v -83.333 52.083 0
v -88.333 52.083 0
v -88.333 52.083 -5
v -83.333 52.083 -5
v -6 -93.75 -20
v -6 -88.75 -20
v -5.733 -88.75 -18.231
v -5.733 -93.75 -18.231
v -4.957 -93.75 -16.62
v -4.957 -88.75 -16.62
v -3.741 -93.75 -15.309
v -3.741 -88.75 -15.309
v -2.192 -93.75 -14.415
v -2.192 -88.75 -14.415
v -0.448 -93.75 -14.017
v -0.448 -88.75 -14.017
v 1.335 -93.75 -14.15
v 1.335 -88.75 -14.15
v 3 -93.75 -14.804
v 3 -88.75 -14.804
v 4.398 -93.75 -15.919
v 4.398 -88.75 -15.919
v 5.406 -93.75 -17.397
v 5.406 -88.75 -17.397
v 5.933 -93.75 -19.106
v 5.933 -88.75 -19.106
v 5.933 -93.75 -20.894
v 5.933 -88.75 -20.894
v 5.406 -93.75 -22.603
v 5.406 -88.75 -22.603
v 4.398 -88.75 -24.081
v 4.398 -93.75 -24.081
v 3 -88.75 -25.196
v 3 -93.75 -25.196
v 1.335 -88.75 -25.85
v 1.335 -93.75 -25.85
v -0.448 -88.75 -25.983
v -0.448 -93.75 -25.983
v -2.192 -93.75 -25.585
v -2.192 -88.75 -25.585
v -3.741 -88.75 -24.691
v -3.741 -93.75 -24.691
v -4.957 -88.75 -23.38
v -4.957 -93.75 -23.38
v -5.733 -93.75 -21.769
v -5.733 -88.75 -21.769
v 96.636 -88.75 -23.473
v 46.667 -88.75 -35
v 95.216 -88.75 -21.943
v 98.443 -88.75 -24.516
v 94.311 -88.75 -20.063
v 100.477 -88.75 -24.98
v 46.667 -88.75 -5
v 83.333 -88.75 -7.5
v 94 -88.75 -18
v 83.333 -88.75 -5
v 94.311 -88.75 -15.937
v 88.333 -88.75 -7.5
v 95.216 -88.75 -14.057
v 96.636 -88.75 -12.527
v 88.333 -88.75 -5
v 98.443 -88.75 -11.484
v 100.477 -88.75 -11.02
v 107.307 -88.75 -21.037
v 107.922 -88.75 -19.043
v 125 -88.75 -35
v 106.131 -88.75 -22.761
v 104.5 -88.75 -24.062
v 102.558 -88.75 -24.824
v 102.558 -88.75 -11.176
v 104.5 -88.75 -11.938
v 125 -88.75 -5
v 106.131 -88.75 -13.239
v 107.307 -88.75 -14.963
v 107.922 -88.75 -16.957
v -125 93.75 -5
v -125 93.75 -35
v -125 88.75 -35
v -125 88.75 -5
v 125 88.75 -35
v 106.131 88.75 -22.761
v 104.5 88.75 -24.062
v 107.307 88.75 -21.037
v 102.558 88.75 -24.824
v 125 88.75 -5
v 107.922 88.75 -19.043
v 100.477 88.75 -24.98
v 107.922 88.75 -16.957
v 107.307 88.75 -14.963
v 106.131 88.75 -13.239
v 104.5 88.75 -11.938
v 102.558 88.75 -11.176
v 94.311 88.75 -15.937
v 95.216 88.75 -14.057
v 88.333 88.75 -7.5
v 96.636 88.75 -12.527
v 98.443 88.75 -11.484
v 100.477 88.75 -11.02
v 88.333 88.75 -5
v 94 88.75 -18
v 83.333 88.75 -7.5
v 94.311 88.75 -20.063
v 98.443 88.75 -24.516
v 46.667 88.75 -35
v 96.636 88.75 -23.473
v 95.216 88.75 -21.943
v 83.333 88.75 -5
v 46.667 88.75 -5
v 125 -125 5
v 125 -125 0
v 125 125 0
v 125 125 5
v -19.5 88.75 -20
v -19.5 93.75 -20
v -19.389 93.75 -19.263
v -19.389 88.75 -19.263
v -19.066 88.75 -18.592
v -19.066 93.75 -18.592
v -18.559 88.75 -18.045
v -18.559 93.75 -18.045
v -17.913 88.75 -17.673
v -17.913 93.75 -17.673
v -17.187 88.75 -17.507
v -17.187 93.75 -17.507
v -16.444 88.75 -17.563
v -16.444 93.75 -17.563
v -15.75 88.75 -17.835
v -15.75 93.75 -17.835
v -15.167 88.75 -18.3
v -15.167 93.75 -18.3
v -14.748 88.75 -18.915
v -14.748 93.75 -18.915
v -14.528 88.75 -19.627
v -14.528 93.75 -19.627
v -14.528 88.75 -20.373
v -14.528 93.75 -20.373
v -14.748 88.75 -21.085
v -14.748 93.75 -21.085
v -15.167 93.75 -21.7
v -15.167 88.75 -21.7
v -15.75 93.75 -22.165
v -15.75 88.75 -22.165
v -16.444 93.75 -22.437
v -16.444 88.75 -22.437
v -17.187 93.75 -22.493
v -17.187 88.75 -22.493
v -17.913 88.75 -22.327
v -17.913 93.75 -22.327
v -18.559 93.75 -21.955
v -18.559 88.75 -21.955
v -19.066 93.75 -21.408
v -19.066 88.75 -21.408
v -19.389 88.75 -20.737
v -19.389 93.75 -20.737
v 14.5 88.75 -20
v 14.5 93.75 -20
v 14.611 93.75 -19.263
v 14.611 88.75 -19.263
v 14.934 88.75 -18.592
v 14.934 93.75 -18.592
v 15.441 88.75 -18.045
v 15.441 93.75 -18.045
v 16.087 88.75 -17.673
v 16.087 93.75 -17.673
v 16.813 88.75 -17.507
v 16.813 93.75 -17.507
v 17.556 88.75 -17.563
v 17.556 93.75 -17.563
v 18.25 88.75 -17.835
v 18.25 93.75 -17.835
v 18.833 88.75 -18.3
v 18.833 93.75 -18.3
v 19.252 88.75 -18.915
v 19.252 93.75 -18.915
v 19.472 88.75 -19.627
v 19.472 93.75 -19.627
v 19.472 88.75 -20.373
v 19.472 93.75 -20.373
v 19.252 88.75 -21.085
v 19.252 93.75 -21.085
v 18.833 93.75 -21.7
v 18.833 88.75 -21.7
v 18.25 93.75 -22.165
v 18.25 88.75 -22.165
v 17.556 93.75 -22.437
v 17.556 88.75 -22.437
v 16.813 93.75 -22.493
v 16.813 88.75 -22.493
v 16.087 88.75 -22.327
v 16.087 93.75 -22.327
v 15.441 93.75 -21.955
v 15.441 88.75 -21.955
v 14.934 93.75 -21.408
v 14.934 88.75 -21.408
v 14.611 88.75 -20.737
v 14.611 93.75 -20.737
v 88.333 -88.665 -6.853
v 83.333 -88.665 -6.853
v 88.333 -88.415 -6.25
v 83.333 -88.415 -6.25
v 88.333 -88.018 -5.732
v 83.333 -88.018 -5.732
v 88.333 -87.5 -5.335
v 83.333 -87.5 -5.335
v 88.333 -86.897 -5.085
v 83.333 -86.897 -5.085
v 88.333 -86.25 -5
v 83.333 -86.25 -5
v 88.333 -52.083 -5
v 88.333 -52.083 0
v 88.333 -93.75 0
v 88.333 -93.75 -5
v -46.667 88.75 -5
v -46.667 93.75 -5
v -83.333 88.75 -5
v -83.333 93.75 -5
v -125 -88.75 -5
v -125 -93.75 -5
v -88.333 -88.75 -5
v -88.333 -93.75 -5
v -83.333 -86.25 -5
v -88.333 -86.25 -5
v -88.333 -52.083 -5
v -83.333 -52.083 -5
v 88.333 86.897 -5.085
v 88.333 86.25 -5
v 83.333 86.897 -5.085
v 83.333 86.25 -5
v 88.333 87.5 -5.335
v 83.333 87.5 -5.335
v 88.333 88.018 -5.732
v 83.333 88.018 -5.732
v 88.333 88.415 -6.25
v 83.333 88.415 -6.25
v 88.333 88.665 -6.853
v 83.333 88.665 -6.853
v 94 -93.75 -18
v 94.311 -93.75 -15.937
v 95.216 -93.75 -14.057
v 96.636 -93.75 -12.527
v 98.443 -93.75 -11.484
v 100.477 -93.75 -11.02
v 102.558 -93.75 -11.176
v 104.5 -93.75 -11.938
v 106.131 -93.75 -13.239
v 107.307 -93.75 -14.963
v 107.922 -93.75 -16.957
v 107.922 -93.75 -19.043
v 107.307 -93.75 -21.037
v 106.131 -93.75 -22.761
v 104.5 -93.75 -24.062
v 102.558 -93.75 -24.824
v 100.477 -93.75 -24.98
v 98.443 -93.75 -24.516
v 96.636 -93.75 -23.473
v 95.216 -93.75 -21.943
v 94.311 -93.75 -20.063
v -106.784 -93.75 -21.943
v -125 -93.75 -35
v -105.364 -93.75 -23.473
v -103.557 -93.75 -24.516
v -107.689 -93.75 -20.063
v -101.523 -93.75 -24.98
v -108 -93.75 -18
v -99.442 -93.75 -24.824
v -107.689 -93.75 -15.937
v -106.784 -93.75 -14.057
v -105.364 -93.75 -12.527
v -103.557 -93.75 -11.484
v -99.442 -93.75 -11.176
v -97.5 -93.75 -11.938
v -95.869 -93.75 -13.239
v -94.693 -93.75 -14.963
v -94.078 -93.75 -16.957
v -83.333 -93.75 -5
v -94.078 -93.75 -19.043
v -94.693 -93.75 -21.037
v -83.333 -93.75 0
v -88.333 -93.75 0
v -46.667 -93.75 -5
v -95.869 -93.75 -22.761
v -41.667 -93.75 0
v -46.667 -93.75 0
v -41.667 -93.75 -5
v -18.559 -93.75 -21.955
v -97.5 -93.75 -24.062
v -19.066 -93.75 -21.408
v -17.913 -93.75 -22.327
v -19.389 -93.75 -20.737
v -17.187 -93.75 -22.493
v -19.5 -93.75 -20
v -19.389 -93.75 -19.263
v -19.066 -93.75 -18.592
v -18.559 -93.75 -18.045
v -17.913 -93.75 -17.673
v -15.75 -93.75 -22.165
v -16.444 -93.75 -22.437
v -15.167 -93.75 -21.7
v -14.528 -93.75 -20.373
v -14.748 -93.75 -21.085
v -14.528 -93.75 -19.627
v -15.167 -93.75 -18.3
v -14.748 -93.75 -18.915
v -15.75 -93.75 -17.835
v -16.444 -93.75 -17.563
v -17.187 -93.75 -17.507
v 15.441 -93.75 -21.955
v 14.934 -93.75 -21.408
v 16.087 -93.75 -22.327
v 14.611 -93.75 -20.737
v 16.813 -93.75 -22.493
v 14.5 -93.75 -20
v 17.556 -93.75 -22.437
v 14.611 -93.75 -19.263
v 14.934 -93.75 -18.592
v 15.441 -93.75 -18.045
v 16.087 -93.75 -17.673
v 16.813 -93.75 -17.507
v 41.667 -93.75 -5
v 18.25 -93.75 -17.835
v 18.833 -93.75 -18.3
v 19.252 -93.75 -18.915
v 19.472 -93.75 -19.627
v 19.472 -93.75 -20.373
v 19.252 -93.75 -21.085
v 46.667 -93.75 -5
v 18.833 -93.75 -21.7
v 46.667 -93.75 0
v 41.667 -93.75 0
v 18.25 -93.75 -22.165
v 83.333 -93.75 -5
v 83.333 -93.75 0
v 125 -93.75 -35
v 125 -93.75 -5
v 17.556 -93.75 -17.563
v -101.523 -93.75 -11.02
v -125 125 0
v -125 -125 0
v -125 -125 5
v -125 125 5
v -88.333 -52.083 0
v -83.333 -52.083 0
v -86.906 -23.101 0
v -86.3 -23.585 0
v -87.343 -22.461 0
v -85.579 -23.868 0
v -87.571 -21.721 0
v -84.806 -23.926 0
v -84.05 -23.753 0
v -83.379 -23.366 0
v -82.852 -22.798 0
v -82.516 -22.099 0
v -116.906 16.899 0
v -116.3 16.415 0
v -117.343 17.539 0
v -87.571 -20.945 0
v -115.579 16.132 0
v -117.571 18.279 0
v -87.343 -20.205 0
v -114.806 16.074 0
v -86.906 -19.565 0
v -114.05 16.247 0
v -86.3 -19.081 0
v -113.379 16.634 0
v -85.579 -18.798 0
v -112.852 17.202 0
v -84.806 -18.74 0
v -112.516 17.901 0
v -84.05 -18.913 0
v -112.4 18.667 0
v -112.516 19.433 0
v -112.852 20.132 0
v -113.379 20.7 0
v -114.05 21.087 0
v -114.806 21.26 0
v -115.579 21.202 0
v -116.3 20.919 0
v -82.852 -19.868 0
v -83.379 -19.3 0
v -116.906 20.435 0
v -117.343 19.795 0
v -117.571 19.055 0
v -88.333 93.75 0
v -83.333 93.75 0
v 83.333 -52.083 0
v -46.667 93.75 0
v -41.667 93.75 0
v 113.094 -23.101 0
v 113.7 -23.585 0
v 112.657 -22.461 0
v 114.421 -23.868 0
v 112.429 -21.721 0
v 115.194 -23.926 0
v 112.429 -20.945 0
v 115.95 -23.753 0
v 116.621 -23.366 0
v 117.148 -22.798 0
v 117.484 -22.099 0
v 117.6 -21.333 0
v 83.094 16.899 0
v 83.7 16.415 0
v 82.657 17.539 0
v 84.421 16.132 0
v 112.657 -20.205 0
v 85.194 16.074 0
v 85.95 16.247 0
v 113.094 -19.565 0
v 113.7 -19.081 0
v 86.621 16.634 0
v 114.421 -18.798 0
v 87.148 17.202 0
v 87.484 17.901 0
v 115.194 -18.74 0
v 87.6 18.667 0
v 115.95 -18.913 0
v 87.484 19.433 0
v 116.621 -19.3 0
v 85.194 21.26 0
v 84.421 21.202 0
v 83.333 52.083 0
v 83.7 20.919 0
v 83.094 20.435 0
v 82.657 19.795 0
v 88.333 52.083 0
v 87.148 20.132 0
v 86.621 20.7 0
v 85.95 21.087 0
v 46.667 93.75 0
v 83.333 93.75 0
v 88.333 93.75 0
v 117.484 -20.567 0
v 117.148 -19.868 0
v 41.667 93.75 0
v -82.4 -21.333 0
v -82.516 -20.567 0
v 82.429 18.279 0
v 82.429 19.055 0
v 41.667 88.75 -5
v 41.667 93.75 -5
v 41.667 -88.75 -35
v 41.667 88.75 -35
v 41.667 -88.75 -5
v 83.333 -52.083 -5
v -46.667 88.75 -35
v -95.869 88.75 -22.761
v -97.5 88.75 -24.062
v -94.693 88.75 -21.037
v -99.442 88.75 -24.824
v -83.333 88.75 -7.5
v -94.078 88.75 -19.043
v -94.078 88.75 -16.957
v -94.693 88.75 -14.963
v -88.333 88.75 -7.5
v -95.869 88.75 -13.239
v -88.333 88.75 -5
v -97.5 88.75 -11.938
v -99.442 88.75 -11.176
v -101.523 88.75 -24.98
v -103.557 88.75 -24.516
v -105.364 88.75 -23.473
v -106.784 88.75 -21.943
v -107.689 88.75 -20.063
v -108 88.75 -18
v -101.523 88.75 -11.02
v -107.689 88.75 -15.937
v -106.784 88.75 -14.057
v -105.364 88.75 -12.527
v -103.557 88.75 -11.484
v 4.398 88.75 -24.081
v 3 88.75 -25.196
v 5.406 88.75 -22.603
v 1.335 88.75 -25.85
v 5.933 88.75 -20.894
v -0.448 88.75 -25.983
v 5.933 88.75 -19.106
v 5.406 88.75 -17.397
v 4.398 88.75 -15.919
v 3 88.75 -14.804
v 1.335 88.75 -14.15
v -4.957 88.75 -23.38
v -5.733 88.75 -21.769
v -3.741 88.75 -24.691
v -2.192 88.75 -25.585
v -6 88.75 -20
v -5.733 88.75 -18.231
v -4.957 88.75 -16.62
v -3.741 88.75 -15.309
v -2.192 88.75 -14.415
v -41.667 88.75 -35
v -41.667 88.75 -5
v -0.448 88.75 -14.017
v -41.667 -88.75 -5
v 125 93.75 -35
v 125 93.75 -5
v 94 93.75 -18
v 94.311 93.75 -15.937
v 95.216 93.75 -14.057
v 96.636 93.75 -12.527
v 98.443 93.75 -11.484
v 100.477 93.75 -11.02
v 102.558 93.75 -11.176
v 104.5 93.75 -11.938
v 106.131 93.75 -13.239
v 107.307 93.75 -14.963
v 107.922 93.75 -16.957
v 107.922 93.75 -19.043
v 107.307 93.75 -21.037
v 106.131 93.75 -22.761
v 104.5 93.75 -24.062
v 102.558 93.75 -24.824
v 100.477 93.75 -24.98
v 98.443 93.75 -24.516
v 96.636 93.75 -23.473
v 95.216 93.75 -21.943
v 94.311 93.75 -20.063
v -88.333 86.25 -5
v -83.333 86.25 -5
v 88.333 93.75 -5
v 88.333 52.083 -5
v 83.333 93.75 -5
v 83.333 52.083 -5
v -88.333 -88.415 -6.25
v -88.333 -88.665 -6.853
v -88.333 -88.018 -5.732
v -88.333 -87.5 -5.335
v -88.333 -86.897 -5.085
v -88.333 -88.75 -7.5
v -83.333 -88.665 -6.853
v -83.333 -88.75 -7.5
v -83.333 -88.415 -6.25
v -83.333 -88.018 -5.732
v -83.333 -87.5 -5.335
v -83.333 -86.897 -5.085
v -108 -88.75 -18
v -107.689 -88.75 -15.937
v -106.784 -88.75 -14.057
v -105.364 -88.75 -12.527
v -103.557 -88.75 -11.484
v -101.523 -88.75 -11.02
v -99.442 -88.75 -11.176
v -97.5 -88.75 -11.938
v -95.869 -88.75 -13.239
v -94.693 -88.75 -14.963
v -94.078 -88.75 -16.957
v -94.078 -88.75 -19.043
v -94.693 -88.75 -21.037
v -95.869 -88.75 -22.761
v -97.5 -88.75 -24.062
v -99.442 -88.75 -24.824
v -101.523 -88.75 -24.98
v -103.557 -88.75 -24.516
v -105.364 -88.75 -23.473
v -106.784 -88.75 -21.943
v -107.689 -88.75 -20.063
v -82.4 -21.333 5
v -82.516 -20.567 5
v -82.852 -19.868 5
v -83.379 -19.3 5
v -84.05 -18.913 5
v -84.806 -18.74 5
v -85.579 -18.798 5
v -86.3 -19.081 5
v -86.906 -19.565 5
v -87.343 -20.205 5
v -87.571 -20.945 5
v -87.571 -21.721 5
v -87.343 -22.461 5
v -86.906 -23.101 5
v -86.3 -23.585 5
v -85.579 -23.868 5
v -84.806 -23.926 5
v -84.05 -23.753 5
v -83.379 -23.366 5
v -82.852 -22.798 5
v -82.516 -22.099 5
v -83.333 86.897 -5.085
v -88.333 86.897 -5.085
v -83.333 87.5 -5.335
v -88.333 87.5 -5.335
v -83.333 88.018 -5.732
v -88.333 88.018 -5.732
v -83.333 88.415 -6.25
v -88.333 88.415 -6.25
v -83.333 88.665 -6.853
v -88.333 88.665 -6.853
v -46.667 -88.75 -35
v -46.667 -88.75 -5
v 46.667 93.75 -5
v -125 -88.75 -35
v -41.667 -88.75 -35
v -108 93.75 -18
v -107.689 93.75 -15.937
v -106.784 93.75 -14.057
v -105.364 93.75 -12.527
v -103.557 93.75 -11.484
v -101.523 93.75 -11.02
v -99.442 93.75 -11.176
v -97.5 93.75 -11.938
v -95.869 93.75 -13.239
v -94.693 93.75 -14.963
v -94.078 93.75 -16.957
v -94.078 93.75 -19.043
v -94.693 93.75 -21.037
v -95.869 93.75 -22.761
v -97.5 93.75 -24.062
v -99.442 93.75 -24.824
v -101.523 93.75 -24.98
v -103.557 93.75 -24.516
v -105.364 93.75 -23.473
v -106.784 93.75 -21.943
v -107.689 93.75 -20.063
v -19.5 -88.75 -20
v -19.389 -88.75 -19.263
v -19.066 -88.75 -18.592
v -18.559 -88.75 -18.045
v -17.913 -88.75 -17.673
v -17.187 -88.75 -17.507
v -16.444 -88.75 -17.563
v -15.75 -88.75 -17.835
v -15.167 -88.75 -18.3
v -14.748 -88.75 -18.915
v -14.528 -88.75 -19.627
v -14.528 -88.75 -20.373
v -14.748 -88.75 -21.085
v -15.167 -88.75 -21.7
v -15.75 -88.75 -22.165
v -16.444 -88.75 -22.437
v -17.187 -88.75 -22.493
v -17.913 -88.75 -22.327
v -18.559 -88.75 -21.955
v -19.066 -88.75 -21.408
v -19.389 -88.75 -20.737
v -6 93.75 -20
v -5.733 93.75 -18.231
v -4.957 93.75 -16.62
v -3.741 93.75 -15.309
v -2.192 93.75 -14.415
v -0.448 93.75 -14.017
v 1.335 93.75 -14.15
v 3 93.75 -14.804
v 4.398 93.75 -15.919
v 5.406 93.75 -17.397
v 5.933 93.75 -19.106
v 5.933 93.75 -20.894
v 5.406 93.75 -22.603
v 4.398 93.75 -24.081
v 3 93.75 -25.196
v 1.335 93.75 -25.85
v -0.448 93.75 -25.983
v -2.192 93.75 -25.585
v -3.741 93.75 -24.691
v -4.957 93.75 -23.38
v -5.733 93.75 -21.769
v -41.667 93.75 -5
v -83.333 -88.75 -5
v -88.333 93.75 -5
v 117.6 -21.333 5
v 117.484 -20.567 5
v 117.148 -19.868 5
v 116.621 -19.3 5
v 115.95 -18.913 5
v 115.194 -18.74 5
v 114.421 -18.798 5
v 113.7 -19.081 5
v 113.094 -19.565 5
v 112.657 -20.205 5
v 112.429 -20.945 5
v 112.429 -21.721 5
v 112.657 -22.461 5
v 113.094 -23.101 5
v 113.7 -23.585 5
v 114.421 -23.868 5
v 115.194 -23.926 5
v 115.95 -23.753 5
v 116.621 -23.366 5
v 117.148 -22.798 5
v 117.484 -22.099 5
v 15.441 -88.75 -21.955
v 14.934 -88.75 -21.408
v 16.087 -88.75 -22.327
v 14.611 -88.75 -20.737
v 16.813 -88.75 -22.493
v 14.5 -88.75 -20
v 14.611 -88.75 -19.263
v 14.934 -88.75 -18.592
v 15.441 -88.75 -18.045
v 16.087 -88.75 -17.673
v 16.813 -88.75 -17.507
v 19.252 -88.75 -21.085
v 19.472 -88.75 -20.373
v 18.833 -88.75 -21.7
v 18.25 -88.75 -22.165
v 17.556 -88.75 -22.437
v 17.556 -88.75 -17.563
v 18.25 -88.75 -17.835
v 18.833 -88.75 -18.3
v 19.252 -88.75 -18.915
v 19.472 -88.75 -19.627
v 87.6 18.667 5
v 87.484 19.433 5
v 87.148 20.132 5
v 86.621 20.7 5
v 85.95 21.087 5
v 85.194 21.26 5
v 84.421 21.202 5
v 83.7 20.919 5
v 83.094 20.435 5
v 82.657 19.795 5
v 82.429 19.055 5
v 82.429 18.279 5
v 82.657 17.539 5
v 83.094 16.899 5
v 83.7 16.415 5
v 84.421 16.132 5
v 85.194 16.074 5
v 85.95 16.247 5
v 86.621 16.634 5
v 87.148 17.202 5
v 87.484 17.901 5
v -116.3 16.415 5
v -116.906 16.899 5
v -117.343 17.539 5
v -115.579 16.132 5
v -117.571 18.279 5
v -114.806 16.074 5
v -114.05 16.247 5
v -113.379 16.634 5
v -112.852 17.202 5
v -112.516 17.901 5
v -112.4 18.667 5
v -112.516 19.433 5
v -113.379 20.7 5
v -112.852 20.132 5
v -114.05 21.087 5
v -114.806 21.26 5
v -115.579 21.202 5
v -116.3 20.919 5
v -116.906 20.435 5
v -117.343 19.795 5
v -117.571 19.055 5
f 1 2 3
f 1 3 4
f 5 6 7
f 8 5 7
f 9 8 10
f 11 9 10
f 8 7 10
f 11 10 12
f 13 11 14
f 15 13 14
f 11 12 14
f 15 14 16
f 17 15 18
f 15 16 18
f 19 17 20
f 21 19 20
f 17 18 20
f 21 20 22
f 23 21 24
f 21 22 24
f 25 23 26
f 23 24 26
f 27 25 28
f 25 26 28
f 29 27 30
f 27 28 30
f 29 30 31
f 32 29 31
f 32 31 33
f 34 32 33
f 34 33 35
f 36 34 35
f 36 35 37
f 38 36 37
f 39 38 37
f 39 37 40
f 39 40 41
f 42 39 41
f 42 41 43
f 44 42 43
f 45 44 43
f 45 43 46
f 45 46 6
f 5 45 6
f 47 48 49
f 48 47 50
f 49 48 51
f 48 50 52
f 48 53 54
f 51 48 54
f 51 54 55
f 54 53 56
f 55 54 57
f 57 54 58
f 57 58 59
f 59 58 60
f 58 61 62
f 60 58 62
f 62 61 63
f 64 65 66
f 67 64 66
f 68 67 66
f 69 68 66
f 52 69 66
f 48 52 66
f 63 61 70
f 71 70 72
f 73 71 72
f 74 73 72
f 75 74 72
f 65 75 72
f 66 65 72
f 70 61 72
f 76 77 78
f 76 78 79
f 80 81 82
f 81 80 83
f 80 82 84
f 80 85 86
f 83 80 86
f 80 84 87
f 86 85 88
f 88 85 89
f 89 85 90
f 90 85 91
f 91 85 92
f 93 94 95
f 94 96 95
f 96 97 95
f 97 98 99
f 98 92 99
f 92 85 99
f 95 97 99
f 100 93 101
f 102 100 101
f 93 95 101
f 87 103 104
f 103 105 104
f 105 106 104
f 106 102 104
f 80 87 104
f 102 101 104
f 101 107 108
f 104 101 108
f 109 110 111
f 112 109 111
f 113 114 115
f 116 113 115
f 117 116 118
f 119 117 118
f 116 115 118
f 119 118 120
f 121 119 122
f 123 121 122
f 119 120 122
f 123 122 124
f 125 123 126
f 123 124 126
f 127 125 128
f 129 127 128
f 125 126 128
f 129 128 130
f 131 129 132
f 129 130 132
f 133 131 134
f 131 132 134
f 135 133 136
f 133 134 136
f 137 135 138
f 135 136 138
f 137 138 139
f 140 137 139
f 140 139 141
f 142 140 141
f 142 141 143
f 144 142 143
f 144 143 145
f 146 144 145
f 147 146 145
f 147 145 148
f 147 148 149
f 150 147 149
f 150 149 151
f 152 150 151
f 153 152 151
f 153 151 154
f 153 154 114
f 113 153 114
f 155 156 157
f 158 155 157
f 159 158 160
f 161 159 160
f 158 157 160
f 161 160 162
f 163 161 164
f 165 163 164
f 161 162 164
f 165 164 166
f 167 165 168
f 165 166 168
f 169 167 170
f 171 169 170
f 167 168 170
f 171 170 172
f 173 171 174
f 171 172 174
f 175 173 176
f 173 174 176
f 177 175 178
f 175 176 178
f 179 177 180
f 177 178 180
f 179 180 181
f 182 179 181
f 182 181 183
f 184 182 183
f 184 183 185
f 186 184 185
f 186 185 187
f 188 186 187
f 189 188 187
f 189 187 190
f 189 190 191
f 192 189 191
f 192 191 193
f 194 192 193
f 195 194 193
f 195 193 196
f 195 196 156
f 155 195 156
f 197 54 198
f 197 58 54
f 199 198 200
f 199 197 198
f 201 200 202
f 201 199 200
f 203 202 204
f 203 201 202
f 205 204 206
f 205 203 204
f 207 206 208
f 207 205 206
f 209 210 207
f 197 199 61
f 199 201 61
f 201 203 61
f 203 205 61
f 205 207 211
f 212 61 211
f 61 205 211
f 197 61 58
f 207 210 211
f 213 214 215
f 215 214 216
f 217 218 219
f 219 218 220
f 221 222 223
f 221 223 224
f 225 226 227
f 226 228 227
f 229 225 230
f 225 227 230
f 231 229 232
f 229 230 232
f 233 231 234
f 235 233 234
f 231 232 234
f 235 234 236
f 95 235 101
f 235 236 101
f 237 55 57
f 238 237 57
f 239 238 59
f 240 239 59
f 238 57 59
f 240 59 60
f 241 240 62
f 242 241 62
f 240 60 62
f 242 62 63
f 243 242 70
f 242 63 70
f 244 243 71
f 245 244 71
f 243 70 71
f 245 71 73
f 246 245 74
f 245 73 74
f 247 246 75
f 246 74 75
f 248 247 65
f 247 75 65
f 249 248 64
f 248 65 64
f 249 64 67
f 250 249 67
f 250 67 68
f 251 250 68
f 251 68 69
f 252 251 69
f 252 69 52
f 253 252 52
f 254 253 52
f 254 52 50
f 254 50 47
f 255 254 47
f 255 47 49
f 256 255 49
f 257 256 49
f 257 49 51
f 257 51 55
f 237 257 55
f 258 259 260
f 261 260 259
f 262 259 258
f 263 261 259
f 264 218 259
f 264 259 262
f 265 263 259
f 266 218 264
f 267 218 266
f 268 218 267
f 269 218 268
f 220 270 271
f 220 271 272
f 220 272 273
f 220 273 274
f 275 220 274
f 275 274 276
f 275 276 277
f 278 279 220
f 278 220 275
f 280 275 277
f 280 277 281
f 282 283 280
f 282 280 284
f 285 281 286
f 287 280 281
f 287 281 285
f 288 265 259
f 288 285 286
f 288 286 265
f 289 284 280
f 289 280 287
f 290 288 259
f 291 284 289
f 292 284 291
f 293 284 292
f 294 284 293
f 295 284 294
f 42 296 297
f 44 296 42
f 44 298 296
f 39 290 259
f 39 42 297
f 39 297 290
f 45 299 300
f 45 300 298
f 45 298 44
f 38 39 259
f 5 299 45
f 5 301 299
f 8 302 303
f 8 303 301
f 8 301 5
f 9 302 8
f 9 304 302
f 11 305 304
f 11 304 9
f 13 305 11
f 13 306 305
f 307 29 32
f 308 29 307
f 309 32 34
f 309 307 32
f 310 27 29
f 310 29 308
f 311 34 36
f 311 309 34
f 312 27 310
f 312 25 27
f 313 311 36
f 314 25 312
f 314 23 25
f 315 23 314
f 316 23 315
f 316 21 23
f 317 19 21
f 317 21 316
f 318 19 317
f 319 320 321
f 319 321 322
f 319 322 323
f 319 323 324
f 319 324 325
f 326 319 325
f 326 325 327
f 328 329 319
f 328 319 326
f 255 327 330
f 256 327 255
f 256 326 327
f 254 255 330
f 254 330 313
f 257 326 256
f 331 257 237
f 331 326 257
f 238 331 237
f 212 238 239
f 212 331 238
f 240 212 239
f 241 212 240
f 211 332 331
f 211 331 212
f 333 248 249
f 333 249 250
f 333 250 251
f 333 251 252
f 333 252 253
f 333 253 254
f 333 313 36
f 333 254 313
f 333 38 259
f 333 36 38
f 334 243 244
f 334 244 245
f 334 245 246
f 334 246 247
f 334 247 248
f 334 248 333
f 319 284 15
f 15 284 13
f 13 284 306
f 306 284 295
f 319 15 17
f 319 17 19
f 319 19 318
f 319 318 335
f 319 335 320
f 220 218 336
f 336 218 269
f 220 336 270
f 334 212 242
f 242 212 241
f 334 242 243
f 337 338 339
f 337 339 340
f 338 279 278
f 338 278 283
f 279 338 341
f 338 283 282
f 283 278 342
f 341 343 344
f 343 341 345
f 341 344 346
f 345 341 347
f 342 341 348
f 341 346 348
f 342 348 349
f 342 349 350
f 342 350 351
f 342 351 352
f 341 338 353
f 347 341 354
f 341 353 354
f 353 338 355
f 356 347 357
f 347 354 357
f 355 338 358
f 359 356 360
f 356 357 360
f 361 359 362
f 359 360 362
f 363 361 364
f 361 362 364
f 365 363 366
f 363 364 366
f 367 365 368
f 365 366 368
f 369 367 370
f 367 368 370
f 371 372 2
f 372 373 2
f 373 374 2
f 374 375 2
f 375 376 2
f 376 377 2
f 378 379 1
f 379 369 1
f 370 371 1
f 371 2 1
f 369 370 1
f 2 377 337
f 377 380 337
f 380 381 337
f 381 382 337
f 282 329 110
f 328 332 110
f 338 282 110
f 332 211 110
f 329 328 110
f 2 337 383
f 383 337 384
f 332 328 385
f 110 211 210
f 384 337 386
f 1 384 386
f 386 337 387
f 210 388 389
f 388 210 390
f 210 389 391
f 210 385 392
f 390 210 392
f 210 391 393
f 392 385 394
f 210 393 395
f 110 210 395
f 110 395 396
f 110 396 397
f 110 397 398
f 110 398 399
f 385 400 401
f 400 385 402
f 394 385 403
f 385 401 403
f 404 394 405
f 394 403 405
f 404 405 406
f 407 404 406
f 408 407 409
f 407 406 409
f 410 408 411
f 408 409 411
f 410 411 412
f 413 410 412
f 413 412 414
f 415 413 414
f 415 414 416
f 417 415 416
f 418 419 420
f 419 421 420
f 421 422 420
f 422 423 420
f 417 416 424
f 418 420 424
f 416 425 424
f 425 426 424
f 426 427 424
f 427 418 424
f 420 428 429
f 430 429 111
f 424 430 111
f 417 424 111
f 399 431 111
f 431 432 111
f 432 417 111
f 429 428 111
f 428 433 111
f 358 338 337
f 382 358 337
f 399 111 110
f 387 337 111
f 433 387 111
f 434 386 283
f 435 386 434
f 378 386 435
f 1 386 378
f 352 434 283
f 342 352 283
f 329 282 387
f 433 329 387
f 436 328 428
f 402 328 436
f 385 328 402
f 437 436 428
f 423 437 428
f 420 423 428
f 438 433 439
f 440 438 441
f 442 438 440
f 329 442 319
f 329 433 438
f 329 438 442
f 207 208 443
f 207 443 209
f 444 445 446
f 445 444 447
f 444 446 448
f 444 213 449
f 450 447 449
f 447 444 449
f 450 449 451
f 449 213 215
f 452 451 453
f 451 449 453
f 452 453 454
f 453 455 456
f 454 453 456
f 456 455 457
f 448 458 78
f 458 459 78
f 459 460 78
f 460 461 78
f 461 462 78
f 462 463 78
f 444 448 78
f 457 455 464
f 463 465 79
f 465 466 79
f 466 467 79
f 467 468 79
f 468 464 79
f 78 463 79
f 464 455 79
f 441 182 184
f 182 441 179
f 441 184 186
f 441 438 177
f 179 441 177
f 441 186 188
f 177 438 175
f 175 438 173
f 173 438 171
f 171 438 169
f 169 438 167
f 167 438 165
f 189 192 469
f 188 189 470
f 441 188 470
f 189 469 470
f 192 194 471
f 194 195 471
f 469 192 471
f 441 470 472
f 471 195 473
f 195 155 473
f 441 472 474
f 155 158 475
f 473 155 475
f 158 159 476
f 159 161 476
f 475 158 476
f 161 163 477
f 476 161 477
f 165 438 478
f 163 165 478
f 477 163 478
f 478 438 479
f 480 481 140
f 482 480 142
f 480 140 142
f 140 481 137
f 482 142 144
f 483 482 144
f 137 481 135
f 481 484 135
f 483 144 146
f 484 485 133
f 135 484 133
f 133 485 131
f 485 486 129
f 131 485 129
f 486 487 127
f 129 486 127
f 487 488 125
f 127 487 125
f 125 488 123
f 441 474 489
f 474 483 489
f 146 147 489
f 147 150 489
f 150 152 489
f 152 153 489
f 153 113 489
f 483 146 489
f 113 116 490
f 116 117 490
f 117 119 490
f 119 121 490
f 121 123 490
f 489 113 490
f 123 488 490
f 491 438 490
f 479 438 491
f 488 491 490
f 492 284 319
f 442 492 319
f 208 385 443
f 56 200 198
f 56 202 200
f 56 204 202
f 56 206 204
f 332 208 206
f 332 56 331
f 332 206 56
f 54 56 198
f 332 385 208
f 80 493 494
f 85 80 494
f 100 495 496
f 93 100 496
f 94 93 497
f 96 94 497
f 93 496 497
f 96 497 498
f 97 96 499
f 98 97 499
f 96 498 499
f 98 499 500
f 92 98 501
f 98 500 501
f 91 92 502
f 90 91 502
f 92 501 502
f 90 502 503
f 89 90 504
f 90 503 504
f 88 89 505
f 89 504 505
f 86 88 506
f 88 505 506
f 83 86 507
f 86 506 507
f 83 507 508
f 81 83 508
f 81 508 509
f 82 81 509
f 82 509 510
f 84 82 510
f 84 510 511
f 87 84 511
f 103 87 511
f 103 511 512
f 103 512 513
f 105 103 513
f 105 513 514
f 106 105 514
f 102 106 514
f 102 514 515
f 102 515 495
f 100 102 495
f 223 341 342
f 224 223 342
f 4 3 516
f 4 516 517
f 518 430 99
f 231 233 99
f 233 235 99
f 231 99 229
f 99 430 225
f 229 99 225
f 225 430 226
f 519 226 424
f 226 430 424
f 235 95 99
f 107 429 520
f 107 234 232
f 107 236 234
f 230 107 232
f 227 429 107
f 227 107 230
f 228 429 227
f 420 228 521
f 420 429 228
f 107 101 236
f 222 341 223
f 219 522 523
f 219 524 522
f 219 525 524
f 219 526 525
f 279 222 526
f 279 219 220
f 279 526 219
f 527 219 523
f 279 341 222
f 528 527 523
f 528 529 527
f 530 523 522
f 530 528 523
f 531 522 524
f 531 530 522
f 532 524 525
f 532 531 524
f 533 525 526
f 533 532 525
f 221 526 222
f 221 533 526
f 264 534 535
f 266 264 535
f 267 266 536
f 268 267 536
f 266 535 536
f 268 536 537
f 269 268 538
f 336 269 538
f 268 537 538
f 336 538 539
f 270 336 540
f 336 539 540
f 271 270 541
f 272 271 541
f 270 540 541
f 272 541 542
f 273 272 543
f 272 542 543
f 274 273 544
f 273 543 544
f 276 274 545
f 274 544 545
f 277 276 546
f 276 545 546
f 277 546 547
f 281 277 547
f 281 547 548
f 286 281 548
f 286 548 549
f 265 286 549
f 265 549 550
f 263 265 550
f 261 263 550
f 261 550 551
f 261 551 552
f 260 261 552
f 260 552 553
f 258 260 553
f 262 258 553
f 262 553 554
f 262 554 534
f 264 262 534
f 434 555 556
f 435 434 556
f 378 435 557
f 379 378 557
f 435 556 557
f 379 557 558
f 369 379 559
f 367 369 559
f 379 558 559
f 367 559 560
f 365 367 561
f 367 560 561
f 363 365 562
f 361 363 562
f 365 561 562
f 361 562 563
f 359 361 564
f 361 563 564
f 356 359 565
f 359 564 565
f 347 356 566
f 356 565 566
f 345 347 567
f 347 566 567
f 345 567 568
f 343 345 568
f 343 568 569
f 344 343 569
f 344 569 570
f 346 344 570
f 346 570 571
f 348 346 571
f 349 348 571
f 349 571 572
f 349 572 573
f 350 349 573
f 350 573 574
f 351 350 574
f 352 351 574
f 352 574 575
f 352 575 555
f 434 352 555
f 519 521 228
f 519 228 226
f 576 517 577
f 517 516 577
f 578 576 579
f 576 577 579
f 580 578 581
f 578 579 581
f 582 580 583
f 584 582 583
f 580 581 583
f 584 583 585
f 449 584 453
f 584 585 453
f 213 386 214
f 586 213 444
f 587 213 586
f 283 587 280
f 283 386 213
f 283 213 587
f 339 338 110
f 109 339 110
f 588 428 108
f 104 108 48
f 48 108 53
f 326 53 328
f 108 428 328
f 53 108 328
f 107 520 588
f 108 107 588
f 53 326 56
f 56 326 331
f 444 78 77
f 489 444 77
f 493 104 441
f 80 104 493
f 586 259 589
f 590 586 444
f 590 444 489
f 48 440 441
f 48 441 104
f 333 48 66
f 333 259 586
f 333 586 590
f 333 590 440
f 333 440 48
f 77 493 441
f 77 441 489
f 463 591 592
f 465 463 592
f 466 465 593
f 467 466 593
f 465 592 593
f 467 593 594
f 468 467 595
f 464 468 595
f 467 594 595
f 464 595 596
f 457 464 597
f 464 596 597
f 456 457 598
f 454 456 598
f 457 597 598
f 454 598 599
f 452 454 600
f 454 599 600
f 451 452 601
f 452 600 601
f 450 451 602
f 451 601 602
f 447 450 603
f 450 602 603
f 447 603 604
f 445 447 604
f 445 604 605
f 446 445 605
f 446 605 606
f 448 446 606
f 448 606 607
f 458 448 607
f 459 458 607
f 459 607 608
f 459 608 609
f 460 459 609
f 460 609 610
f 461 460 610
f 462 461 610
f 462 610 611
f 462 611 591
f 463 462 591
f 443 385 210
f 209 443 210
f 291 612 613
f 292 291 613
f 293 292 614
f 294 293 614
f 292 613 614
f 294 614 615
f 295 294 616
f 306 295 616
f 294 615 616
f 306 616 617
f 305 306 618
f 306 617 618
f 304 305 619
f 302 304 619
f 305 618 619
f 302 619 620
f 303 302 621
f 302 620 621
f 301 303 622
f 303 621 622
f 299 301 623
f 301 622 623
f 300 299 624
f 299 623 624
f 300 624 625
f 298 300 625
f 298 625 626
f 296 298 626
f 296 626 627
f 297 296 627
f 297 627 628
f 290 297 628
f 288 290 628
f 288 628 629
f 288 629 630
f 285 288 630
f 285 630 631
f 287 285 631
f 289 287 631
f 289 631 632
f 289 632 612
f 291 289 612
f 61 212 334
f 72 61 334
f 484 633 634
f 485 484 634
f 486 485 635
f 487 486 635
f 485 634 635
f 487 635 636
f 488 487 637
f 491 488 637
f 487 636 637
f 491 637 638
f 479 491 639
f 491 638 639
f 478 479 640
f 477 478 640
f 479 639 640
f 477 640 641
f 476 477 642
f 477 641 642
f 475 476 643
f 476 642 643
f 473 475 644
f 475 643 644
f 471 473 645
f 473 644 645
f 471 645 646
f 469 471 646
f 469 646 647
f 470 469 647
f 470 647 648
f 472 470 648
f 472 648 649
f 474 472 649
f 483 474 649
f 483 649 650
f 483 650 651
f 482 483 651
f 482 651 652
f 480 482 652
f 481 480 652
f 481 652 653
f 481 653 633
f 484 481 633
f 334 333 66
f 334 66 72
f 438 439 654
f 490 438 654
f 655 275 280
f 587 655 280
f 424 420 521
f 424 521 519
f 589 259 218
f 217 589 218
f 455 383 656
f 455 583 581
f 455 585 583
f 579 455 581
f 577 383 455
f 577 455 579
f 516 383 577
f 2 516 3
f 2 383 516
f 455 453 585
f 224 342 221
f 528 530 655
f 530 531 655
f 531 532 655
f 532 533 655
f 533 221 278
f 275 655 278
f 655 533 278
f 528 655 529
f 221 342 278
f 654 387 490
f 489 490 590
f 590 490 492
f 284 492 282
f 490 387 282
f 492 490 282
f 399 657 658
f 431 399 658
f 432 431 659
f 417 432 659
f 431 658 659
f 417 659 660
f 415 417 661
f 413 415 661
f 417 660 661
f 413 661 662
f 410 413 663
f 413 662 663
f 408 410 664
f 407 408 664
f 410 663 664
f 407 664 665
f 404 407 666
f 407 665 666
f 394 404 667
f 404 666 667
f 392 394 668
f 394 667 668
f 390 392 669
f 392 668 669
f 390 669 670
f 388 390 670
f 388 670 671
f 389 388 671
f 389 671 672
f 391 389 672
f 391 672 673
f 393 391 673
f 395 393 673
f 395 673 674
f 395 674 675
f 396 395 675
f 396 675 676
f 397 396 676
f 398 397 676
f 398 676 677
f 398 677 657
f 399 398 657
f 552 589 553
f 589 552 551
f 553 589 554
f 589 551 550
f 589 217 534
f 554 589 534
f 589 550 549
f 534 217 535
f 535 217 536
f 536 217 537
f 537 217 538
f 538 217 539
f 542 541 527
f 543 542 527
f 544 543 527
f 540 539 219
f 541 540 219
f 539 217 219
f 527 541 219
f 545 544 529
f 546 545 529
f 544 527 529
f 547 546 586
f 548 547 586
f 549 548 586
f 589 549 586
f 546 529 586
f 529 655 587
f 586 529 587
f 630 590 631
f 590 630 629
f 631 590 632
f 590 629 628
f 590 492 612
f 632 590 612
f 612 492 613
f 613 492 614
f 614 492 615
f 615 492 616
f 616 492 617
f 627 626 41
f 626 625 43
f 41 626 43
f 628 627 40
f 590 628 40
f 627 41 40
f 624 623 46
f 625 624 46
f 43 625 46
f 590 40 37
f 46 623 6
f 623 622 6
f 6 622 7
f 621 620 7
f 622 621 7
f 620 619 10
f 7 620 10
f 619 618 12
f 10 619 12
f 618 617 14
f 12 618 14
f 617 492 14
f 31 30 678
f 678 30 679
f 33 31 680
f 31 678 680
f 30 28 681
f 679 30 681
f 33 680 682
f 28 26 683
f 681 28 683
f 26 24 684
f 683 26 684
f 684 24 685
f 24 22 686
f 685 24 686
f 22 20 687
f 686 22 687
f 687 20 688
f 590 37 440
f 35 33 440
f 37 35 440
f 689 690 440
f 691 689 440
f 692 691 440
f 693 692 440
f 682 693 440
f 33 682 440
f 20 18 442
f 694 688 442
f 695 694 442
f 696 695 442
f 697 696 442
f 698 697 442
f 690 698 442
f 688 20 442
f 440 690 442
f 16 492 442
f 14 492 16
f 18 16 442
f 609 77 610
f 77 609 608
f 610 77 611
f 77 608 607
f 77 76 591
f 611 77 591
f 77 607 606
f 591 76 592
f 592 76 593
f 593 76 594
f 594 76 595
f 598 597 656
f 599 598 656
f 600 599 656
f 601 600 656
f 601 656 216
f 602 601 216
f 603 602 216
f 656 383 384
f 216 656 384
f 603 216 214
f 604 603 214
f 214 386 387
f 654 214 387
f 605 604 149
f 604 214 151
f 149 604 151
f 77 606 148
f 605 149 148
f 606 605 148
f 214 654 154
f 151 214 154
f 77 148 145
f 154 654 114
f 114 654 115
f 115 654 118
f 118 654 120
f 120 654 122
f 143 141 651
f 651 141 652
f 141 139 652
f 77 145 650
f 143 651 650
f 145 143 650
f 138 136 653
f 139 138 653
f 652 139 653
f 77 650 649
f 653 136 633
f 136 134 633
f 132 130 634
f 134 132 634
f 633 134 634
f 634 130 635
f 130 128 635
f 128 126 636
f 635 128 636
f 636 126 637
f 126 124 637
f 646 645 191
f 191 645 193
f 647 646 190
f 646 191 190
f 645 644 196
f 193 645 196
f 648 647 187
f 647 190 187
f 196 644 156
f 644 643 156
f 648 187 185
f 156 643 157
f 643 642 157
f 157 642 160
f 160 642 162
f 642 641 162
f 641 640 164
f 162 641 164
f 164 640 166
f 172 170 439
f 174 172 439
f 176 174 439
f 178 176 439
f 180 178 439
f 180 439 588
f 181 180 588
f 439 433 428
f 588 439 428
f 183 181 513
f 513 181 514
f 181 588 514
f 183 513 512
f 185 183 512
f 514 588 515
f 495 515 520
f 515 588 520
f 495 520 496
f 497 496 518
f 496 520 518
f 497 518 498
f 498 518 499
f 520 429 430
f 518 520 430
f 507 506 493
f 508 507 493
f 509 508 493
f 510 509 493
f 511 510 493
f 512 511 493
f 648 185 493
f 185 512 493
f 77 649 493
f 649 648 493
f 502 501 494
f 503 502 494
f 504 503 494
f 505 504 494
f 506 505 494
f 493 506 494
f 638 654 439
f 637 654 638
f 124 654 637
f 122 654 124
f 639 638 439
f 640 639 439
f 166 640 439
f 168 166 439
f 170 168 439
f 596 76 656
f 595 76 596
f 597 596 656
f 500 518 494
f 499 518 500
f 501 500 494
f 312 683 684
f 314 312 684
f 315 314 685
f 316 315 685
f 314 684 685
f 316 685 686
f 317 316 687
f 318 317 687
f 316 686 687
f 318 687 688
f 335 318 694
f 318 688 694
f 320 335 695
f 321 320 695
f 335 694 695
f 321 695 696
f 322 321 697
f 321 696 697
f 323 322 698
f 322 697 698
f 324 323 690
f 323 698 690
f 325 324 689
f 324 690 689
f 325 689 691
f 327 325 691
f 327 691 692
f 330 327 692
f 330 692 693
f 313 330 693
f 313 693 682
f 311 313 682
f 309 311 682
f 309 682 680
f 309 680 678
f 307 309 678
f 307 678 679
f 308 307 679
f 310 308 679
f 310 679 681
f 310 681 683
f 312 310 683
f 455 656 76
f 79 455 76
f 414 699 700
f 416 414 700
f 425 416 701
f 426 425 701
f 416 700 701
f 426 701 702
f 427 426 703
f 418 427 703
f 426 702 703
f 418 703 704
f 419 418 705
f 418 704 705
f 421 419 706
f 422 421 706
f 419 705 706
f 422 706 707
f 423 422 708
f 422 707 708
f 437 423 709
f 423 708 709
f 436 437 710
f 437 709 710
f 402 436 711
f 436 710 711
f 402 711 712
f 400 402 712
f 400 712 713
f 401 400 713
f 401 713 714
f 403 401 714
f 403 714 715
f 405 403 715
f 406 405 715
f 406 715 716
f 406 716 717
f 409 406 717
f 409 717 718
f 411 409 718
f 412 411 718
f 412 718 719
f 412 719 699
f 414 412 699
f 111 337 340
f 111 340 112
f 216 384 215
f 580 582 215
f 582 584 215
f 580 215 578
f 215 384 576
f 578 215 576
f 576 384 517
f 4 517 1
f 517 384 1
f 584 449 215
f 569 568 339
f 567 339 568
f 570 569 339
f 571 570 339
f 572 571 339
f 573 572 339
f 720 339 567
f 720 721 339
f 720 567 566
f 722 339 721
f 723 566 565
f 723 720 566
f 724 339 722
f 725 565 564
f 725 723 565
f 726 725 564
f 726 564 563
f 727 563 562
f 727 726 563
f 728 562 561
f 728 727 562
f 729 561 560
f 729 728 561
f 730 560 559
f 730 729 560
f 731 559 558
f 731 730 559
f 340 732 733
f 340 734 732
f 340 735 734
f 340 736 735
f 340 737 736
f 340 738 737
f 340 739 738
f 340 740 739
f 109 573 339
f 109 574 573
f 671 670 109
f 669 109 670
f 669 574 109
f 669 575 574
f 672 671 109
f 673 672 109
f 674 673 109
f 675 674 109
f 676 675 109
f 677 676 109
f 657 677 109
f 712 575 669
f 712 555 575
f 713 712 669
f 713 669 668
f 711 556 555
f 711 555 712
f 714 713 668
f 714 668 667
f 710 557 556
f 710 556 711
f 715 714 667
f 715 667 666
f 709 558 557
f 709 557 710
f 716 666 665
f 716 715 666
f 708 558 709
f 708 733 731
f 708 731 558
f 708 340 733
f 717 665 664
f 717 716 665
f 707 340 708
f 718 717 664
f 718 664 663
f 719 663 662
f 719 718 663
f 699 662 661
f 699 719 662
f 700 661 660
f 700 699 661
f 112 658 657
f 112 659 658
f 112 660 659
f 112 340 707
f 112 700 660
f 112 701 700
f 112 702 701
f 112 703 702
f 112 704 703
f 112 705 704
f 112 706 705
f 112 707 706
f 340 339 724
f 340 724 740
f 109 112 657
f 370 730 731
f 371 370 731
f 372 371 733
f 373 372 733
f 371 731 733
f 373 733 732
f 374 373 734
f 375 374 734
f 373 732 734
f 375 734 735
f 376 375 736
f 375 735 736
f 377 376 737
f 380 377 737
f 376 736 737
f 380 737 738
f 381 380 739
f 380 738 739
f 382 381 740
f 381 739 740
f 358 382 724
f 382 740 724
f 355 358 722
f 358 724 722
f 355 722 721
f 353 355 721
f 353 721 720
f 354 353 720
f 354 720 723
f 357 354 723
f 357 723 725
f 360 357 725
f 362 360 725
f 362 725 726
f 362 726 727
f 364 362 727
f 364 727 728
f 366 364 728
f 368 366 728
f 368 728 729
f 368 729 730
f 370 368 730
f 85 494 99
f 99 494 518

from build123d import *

# Parameters (mm, degrees)
F2_W      = 250
F2_H      = 250
F3_DEPTH  = 5
F4_W      = 5
F4_H      = 41.6666666667
F5_DEPTH  = 5
F6_W      = 250
F6_H      = 30
F7_DEPTH  = 5
F8_W      = 250
F8_H      = 30
F9_DEPTH  = 5
F11_R     = 2.5
F10_W     = 5
F10_H     = 187.5
F12_DEPTH = 35
F13_R     = 6
F13_R_2   = 7
F13_R_3   = 2.5
F14_DEPTH = 218.751
F15_R     = 2.6
F16_DEPTH = 40.001


with BuildPart() as f3:
    # F2 (on Top) → F3 (new body)
    with BuildSketch(Plane.XY):
        Rectangle(F2_W, F2_H)
    extrude(amount=F3_DEPTH)

    # F4 (on face) → F5 (join)
    with BuildSketch(Plane(origin=(0, 0, 0), x_dir=(1, 0, 0), z_dir=(0, 0, -1))):
        with Locations((-85.8333333333, 72.9166666667)):
            Rectangle(F4_W, F4_H)
        with Locations((85.8333333333, 72.9166666667)):
            Rectangle(F4_W, F4_H)
        with Locations((-85.8333333333, -72.9166666667)):
            Rectangle(F4_W, F4_H)
        with Locations((85.8333333333, -72.9166666667)):
            Rectangle(F4_W, F4_H)
    extrude(amount=F5_DEPTH)

    # F6 (on face) → F7 (join)
    with BuildSketch(Plane(origin=(0, 93.75, 0), x_dir=(-1, 0, 0), z_dir=(0, 1, 0))):
        with Locations((0, -20)):
            Rectangle(F6_W, F6_H)
    extrude(amount=-F7_DEPTH)

    # F8 (on face) → F9 (join)
    with BuildSketch(Plane.XZ.offset(93.75)):
        with Locations((0, -20)):
            Rectangle(F8_W, F8_H)
    extrude(amount=-F9_DEPTH)

    # F11
    f11_edges = [f3.edges().sort_by_distance(p)[0] for p in [
        (85.833333, -88.75, -5),
        (-85.833333, -88.75, -5),
        (85.833333, 88.75, -5),
        (-85.833333, 88.75, -5),
    ]]
    fillet(f11_edges, radius=F11_R)

    # F10 (on face) → F12 (join, through all)
    with BuildSketch(Plane(origin=(0, 0, 0), x_dir=(1, 0, 0), z_dir=(0, 0, -1))):
        with Locations((44.1666666667, 0)):
            Rectangle(F10_W, F10_H)
        with Locations((-44.1666666667, 0)):
            Rectangle(F10_W, F10_H)
    extrude(amount=F12_DEPTH)

    # F13 (on face) → F14 (cut, through all)
    with BuildSketch(Plane(origin=(0, 93.75, 0), x_dir=(-1, 0, 0), z_dir=(0, 1, 0))):
        with Locations((0, -20)):
            Circle(F13_R)
        with Locations((-101, -18)):
            Circle(F13_R_2)
        with Locations((101, -18)):
            Circle(F13_R_2)
        with Locations((17, -20)):
            Circle(F13_R_3)
        with Locations((-17, -20)):
            Circle(F13_R_3)
    extrude(amount=-F14_DEPTH, mode=Mode.SUBTRACT)

    # F15 (on face) → F16 (cut, through all)
    with BuildSketch(Plane.XY.offset(5)):
        with Locations((-85, -21.333)):
            Circle(F15_R)
        with Locations((-115, 18.667)):
            Circle(F15_R)
        with Locations((115, -21.333)):
            Circle(F15_R)
        with Locations((85, 18.667)):
            Circle(F15_R)
    extrude(amount=-F16_DEPTH, mode=Mode.SUBTRACT)


solid = f3.part
